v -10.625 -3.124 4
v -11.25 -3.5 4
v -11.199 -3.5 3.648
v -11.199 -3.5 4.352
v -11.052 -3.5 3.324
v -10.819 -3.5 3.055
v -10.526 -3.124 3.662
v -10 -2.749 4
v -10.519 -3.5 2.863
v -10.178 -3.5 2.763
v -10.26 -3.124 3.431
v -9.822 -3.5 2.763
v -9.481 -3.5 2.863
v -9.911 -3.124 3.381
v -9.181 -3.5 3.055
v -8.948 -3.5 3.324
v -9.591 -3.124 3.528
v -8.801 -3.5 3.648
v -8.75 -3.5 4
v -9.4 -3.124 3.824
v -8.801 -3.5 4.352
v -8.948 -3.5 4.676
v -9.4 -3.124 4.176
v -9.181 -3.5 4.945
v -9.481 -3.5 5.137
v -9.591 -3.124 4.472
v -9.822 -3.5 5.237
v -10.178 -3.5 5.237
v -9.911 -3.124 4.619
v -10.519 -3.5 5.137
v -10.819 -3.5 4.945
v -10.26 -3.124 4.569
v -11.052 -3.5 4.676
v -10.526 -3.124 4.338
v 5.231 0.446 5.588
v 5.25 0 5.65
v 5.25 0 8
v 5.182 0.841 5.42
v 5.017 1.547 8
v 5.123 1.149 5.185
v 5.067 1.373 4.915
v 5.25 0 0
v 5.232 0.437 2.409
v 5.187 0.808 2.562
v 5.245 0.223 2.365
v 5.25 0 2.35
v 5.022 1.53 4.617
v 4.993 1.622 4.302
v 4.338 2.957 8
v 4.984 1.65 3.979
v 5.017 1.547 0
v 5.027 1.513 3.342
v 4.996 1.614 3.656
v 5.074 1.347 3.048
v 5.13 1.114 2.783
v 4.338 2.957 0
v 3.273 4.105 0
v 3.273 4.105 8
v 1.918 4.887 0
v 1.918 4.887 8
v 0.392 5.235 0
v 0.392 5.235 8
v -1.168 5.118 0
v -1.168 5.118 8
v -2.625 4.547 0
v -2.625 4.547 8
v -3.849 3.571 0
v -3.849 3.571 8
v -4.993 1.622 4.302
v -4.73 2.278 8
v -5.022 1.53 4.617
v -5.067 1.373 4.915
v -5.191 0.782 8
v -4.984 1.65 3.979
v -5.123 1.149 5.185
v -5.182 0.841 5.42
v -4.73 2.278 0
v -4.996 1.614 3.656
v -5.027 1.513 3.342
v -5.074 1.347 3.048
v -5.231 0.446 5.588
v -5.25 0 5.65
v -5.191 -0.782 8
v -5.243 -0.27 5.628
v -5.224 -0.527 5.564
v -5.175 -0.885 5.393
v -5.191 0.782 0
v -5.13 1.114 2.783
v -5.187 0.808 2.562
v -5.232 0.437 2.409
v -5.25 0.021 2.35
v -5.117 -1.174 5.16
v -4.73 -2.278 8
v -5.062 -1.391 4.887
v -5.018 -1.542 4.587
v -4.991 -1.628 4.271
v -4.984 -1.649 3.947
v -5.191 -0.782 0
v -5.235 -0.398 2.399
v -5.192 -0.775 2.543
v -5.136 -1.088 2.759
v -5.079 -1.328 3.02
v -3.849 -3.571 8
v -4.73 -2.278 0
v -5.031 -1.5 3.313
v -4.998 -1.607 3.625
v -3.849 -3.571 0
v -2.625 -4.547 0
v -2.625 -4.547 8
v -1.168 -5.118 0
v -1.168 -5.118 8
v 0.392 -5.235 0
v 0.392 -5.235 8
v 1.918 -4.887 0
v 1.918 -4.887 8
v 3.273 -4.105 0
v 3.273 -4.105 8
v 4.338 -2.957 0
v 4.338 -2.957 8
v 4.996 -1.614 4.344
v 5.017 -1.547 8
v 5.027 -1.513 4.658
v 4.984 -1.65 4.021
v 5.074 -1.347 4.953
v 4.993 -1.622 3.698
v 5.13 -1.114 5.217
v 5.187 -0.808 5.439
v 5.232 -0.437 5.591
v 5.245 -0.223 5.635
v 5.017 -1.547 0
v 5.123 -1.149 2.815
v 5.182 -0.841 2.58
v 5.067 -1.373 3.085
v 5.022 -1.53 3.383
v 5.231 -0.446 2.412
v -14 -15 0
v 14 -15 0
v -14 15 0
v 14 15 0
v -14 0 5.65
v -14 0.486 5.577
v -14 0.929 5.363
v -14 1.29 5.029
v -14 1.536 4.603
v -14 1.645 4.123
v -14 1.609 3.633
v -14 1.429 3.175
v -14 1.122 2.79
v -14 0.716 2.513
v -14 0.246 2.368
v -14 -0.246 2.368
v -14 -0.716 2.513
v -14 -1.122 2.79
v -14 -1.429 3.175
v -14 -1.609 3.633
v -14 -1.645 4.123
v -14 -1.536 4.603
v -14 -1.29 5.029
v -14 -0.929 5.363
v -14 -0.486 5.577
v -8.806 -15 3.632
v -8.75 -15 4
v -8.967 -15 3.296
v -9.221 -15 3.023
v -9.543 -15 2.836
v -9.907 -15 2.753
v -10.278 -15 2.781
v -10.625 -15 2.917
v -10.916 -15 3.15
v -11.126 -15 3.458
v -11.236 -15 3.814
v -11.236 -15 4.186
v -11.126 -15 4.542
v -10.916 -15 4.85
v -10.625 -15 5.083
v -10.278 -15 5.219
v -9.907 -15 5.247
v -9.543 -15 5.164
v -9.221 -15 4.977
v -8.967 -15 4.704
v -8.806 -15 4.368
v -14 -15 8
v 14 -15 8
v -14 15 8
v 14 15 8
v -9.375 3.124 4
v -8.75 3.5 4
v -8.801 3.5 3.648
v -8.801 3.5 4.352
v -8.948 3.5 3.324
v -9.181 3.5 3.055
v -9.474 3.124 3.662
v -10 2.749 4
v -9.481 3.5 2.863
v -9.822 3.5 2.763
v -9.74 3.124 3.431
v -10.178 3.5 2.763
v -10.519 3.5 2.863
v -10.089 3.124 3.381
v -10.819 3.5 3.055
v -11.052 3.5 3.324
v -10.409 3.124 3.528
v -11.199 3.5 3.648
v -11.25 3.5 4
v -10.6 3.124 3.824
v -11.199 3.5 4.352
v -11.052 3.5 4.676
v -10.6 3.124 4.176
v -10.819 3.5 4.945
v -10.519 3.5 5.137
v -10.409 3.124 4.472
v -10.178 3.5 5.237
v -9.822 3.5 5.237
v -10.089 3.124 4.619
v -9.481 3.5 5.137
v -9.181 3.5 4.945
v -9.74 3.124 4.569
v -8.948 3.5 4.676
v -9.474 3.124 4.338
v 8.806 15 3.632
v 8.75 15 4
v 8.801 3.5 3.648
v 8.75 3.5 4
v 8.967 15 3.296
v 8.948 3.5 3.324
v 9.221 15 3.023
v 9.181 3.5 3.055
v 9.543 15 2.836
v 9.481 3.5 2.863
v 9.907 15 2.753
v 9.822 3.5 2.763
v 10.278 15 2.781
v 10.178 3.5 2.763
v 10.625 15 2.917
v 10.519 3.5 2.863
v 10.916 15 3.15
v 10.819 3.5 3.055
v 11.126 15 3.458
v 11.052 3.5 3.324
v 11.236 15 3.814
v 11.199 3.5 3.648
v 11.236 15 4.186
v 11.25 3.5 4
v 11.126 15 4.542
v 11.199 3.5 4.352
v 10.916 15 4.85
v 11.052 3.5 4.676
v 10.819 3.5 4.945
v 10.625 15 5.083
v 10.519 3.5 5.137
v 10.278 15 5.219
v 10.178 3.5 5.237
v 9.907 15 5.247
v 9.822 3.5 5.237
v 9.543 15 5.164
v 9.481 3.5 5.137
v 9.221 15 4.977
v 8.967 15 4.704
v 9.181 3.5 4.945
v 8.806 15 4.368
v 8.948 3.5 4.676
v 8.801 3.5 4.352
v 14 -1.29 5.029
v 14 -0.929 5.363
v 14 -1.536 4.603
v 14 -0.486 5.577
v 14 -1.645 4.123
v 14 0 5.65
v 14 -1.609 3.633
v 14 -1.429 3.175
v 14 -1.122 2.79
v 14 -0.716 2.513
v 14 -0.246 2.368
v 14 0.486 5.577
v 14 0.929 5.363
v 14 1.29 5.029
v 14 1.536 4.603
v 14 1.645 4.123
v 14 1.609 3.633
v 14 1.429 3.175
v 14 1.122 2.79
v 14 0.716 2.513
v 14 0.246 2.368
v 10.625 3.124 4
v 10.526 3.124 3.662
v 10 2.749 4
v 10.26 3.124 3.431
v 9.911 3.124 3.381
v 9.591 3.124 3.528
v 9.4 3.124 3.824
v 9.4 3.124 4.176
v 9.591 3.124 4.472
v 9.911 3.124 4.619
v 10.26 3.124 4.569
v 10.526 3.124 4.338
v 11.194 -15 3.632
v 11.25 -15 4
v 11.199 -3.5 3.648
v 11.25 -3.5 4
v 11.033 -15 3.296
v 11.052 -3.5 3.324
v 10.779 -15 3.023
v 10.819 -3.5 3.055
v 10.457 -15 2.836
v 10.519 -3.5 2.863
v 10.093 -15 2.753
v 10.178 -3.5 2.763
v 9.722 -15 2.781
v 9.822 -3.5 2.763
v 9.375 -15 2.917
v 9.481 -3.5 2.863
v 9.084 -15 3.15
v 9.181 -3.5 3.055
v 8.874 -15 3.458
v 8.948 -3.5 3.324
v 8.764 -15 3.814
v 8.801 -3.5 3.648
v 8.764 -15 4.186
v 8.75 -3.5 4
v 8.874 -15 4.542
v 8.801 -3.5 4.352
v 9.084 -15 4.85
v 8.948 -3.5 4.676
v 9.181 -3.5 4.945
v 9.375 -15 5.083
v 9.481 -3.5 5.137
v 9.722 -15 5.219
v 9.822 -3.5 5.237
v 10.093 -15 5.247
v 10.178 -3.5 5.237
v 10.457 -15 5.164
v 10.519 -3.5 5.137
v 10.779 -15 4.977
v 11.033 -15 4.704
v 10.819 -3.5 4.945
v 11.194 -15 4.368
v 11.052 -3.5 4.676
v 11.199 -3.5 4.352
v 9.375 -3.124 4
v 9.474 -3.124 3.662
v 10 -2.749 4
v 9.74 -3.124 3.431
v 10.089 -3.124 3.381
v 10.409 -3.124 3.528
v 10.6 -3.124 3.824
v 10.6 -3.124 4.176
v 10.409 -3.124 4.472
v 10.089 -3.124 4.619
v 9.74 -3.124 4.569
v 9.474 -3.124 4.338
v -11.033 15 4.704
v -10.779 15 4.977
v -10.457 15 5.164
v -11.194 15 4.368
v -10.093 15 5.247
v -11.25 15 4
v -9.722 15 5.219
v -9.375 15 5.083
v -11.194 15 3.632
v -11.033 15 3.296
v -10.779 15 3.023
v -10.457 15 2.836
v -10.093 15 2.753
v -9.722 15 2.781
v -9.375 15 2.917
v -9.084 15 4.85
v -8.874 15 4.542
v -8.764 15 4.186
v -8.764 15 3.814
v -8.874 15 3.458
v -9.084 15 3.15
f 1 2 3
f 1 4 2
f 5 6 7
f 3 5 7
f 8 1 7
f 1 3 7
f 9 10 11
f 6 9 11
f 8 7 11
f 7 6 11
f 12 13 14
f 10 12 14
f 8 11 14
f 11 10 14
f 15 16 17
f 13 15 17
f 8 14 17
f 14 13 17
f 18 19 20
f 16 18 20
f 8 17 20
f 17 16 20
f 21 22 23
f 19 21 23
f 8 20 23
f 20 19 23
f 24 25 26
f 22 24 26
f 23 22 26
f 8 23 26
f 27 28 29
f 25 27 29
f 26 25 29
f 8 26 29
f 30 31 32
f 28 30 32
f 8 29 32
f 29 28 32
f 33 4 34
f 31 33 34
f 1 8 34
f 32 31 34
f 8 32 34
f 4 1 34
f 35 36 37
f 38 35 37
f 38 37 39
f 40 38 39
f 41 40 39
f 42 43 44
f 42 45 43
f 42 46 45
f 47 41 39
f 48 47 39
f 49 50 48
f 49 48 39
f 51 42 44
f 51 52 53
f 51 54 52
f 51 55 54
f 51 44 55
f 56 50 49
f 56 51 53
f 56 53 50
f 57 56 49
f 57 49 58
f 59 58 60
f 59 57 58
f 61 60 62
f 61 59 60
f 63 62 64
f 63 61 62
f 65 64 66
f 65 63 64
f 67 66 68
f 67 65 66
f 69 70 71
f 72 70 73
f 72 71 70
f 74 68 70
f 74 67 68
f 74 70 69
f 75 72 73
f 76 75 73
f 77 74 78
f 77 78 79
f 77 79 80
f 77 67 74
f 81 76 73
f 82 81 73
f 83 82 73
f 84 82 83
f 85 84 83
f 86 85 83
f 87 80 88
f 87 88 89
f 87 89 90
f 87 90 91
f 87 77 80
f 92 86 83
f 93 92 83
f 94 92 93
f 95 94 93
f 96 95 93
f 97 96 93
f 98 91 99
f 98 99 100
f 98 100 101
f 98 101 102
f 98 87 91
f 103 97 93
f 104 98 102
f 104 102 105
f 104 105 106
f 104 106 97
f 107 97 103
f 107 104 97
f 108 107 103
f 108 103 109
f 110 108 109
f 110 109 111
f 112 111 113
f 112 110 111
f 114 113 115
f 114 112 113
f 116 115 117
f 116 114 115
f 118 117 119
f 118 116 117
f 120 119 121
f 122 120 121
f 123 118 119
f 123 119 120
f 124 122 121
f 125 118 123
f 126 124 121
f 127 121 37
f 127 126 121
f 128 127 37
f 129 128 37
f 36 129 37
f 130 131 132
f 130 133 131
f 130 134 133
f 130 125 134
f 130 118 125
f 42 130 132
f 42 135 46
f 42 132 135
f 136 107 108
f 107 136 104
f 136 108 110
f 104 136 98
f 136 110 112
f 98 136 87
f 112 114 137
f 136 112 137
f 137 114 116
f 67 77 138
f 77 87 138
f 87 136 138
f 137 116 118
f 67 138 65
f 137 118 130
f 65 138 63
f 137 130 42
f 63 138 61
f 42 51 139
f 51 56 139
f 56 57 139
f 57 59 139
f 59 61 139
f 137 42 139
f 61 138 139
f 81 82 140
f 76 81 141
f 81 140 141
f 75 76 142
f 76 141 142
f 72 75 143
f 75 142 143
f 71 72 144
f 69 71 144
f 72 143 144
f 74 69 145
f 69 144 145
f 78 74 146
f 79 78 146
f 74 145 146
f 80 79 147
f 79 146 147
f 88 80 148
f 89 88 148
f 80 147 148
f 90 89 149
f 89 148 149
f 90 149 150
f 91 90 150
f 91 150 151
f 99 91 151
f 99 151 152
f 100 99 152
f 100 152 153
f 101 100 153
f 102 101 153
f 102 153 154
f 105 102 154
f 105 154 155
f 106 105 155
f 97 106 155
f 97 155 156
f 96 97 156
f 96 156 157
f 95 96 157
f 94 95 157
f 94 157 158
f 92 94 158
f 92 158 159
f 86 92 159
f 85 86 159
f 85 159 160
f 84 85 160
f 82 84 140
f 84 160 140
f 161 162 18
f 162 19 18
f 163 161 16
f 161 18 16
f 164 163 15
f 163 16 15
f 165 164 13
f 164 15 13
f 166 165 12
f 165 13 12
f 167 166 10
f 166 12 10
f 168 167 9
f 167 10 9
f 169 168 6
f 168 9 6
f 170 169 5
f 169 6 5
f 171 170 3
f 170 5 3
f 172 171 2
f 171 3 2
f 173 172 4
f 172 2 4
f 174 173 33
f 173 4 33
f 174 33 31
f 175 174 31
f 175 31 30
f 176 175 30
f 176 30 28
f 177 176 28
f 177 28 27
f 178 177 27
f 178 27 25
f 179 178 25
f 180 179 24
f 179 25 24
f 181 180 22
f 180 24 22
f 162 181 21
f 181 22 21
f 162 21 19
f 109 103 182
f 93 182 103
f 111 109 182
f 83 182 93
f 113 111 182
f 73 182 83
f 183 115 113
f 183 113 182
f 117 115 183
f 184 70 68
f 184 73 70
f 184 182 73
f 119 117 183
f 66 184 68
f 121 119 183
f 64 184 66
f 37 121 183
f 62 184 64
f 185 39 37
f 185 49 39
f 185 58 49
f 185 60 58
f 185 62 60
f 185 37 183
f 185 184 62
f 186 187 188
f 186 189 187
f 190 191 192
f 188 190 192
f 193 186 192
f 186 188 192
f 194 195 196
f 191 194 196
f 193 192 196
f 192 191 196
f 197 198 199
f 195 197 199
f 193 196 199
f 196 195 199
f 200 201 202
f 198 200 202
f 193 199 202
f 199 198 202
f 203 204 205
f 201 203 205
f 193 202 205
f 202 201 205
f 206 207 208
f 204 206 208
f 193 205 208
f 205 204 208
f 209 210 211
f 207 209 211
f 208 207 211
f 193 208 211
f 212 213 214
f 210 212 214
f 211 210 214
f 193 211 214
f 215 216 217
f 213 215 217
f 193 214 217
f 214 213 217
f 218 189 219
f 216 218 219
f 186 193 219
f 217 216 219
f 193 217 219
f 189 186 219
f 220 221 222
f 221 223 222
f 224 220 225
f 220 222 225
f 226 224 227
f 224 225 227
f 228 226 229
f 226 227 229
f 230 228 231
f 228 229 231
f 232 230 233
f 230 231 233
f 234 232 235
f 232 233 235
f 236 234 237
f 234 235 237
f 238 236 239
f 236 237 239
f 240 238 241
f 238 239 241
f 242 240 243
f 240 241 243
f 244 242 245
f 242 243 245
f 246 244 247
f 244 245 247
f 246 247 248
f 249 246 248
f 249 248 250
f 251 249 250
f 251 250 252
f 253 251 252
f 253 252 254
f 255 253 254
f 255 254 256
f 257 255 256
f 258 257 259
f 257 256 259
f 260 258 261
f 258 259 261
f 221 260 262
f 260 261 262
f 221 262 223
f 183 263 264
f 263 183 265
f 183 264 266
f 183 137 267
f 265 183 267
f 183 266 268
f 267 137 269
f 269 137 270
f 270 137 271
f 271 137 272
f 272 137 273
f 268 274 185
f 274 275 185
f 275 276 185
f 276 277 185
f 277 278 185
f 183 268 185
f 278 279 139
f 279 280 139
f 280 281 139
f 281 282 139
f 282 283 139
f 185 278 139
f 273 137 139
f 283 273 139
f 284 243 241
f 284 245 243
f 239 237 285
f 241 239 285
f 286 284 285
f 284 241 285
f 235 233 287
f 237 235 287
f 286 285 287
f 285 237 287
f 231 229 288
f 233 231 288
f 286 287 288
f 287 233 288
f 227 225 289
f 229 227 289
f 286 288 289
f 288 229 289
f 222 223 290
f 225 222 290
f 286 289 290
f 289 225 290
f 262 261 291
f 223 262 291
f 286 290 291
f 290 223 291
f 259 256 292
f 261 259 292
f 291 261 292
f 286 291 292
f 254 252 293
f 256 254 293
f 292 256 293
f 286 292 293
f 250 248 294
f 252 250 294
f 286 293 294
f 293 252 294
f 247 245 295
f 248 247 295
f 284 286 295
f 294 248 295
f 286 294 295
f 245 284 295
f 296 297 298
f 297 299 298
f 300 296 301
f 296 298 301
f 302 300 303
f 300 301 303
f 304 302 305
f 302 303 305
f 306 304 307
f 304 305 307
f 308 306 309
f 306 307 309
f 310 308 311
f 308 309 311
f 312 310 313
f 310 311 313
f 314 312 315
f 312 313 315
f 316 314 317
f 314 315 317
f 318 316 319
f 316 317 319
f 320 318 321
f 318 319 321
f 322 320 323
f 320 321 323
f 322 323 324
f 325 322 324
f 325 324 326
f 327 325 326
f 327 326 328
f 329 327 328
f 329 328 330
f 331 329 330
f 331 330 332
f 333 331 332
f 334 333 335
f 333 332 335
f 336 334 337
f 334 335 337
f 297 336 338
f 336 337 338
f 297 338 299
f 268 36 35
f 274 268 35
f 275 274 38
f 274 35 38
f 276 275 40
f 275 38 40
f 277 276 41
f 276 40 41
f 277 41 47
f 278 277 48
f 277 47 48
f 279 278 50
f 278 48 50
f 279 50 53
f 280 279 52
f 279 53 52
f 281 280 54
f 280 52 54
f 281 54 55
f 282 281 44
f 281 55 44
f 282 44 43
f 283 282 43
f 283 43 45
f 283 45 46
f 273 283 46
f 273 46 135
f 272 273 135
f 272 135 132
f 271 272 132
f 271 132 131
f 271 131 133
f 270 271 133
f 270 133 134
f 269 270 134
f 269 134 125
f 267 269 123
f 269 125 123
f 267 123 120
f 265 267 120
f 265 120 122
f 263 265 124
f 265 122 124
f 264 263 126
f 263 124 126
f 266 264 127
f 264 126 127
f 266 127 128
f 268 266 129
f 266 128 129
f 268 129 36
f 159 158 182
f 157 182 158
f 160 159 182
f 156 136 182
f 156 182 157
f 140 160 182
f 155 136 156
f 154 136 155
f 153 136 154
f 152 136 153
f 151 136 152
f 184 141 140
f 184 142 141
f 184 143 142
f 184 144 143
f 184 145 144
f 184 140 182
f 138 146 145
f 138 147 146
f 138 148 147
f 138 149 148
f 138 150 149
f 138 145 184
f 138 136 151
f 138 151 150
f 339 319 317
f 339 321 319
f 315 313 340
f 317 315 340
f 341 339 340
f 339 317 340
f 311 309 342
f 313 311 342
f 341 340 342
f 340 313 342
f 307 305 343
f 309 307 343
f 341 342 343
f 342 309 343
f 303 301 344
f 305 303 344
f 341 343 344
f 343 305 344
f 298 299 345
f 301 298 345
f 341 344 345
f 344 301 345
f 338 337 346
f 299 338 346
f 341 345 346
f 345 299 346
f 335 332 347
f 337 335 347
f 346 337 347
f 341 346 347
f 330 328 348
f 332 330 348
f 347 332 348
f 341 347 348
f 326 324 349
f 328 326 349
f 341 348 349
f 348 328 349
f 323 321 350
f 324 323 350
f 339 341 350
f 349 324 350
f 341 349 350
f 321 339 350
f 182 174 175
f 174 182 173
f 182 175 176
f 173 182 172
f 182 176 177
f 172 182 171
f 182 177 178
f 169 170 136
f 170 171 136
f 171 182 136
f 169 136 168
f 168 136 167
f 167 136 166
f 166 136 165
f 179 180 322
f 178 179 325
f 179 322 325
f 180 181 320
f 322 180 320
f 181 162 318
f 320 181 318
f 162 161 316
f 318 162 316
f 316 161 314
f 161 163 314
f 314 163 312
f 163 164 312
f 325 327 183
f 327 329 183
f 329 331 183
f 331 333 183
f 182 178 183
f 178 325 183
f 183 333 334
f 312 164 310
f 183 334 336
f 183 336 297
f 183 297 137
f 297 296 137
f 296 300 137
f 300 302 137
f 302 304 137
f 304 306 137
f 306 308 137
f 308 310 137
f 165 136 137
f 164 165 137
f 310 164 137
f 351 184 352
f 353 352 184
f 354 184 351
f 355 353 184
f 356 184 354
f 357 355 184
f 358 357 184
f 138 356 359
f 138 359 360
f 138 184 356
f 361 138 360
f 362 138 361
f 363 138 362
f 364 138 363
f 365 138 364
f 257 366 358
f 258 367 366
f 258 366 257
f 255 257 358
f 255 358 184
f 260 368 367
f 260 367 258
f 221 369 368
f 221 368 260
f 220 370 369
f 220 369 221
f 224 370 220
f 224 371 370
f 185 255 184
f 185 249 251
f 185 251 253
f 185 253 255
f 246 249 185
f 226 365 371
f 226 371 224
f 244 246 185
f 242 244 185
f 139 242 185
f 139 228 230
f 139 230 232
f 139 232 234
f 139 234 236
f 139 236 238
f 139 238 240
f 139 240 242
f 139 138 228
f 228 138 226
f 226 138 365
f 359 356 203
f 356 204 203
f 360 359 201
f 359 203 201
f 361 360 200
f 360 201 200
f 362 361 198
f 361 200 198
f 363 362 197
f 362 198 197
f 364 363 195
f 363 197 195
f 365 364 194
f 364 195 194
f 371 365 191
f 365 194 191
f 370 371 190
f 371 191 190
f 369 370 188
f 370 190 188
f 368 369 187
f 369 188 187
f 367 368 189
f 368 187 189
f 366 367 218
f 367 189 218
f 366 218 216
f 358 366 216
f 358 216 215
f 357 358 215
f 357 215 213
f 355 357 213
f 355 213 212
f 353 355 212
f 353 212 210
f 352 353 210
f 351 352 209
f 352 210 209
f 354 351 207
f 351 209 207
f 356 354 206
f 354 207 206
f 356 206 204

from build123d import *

# Parameters (mm, degrees)
SKETCH_1_W             = 28
SKETCH_1_H             = 30
SKETCH_1_R             = 5.25
EXTRUDE_1_DEPTH        = 8
HOLE_WIZARD_M3_1_D     = 2.5
HOLE_WIZARD_M3_1_DEPTH = 11.5
HOLE_WIZARD_M3_1_TIP   = 0.751075774
HOLE_WIZARD_M3_2_D     = 2.5
HOLE_WIZARD_M3_2_DEPTH = 11.5
HOLE_WIZARD_M3_2_TIP   = 0.751075774
HOLE_WIZARD_M4_1_D     = 3.3


with BuildPart() as part:
    # 草图1 → 凸台-拉伸1 (new body)
    with BuildSketch(Plane.XY):
        Rectangle(SKETCH_1_W, SKETCH_1_H)
        Circle(SKETCH_1_R, mode=Mode.SUBTRACT)
    extrude(amount=EXTRUDE_1_DEPTH)

    # M3 螺纹孔1
    with Locations(Plane(origin=(0, 15, 0), x_dir=(1, 0, 0), z_dir=(0, 1, 0))):
        with Locations((-10, -4), (10, -4)):
            Hole(HOLE_WIZARD_M3_1_D / 2, depth=HOLE_WIZARD_M3_1_DEPTH)
            with Locations((0, 0, -(HOLE_WIZARD_M3_1_DEPTH + HOLE_WIZARD_M3_1_TIP / 2))):  # 118° drill point
                Cone(0, HOLE_WIZARD_M3_1_D / 2, HOLE_WIZARD_M3_1_TIP, mode=Mode.SUBTRACT)

    # M3 螺纹孔2
    with Locations(Plane(origin=(0, -15, 0), x_dir=(-1, 0, 0), z_dir=(0, -1, 0))):
        with Locations((10, -4), (-10, -4)):
            Hole(HOLE_WIZARD_M3_2_D / 2, depth=HOLE_WIZARD_M3_2_DEPTH)
            with Locations((0, 0, -(HOLE_WIZARD_M3_2_DEPTH + HOLE_WIZARD_M3_2_TIP / 2))):  # 118° drill point
                Cone(0, HOLE_WIZARD_M3_2_D / 2, HOLE_WIZARD_M3_2_TIP, mode=Mode.SUBTRACT)

    # M4 螺纹孔1 (through all)
    with Locations(Plane(origin=(14, 0, 0), x_dir=(0, 0, -1), z_dir=(1, 0, 0))):
        with Locations((-4, 0)):
            Hole(HOLE_WIZARD_M4_1_D / 2)


solid = part.part
